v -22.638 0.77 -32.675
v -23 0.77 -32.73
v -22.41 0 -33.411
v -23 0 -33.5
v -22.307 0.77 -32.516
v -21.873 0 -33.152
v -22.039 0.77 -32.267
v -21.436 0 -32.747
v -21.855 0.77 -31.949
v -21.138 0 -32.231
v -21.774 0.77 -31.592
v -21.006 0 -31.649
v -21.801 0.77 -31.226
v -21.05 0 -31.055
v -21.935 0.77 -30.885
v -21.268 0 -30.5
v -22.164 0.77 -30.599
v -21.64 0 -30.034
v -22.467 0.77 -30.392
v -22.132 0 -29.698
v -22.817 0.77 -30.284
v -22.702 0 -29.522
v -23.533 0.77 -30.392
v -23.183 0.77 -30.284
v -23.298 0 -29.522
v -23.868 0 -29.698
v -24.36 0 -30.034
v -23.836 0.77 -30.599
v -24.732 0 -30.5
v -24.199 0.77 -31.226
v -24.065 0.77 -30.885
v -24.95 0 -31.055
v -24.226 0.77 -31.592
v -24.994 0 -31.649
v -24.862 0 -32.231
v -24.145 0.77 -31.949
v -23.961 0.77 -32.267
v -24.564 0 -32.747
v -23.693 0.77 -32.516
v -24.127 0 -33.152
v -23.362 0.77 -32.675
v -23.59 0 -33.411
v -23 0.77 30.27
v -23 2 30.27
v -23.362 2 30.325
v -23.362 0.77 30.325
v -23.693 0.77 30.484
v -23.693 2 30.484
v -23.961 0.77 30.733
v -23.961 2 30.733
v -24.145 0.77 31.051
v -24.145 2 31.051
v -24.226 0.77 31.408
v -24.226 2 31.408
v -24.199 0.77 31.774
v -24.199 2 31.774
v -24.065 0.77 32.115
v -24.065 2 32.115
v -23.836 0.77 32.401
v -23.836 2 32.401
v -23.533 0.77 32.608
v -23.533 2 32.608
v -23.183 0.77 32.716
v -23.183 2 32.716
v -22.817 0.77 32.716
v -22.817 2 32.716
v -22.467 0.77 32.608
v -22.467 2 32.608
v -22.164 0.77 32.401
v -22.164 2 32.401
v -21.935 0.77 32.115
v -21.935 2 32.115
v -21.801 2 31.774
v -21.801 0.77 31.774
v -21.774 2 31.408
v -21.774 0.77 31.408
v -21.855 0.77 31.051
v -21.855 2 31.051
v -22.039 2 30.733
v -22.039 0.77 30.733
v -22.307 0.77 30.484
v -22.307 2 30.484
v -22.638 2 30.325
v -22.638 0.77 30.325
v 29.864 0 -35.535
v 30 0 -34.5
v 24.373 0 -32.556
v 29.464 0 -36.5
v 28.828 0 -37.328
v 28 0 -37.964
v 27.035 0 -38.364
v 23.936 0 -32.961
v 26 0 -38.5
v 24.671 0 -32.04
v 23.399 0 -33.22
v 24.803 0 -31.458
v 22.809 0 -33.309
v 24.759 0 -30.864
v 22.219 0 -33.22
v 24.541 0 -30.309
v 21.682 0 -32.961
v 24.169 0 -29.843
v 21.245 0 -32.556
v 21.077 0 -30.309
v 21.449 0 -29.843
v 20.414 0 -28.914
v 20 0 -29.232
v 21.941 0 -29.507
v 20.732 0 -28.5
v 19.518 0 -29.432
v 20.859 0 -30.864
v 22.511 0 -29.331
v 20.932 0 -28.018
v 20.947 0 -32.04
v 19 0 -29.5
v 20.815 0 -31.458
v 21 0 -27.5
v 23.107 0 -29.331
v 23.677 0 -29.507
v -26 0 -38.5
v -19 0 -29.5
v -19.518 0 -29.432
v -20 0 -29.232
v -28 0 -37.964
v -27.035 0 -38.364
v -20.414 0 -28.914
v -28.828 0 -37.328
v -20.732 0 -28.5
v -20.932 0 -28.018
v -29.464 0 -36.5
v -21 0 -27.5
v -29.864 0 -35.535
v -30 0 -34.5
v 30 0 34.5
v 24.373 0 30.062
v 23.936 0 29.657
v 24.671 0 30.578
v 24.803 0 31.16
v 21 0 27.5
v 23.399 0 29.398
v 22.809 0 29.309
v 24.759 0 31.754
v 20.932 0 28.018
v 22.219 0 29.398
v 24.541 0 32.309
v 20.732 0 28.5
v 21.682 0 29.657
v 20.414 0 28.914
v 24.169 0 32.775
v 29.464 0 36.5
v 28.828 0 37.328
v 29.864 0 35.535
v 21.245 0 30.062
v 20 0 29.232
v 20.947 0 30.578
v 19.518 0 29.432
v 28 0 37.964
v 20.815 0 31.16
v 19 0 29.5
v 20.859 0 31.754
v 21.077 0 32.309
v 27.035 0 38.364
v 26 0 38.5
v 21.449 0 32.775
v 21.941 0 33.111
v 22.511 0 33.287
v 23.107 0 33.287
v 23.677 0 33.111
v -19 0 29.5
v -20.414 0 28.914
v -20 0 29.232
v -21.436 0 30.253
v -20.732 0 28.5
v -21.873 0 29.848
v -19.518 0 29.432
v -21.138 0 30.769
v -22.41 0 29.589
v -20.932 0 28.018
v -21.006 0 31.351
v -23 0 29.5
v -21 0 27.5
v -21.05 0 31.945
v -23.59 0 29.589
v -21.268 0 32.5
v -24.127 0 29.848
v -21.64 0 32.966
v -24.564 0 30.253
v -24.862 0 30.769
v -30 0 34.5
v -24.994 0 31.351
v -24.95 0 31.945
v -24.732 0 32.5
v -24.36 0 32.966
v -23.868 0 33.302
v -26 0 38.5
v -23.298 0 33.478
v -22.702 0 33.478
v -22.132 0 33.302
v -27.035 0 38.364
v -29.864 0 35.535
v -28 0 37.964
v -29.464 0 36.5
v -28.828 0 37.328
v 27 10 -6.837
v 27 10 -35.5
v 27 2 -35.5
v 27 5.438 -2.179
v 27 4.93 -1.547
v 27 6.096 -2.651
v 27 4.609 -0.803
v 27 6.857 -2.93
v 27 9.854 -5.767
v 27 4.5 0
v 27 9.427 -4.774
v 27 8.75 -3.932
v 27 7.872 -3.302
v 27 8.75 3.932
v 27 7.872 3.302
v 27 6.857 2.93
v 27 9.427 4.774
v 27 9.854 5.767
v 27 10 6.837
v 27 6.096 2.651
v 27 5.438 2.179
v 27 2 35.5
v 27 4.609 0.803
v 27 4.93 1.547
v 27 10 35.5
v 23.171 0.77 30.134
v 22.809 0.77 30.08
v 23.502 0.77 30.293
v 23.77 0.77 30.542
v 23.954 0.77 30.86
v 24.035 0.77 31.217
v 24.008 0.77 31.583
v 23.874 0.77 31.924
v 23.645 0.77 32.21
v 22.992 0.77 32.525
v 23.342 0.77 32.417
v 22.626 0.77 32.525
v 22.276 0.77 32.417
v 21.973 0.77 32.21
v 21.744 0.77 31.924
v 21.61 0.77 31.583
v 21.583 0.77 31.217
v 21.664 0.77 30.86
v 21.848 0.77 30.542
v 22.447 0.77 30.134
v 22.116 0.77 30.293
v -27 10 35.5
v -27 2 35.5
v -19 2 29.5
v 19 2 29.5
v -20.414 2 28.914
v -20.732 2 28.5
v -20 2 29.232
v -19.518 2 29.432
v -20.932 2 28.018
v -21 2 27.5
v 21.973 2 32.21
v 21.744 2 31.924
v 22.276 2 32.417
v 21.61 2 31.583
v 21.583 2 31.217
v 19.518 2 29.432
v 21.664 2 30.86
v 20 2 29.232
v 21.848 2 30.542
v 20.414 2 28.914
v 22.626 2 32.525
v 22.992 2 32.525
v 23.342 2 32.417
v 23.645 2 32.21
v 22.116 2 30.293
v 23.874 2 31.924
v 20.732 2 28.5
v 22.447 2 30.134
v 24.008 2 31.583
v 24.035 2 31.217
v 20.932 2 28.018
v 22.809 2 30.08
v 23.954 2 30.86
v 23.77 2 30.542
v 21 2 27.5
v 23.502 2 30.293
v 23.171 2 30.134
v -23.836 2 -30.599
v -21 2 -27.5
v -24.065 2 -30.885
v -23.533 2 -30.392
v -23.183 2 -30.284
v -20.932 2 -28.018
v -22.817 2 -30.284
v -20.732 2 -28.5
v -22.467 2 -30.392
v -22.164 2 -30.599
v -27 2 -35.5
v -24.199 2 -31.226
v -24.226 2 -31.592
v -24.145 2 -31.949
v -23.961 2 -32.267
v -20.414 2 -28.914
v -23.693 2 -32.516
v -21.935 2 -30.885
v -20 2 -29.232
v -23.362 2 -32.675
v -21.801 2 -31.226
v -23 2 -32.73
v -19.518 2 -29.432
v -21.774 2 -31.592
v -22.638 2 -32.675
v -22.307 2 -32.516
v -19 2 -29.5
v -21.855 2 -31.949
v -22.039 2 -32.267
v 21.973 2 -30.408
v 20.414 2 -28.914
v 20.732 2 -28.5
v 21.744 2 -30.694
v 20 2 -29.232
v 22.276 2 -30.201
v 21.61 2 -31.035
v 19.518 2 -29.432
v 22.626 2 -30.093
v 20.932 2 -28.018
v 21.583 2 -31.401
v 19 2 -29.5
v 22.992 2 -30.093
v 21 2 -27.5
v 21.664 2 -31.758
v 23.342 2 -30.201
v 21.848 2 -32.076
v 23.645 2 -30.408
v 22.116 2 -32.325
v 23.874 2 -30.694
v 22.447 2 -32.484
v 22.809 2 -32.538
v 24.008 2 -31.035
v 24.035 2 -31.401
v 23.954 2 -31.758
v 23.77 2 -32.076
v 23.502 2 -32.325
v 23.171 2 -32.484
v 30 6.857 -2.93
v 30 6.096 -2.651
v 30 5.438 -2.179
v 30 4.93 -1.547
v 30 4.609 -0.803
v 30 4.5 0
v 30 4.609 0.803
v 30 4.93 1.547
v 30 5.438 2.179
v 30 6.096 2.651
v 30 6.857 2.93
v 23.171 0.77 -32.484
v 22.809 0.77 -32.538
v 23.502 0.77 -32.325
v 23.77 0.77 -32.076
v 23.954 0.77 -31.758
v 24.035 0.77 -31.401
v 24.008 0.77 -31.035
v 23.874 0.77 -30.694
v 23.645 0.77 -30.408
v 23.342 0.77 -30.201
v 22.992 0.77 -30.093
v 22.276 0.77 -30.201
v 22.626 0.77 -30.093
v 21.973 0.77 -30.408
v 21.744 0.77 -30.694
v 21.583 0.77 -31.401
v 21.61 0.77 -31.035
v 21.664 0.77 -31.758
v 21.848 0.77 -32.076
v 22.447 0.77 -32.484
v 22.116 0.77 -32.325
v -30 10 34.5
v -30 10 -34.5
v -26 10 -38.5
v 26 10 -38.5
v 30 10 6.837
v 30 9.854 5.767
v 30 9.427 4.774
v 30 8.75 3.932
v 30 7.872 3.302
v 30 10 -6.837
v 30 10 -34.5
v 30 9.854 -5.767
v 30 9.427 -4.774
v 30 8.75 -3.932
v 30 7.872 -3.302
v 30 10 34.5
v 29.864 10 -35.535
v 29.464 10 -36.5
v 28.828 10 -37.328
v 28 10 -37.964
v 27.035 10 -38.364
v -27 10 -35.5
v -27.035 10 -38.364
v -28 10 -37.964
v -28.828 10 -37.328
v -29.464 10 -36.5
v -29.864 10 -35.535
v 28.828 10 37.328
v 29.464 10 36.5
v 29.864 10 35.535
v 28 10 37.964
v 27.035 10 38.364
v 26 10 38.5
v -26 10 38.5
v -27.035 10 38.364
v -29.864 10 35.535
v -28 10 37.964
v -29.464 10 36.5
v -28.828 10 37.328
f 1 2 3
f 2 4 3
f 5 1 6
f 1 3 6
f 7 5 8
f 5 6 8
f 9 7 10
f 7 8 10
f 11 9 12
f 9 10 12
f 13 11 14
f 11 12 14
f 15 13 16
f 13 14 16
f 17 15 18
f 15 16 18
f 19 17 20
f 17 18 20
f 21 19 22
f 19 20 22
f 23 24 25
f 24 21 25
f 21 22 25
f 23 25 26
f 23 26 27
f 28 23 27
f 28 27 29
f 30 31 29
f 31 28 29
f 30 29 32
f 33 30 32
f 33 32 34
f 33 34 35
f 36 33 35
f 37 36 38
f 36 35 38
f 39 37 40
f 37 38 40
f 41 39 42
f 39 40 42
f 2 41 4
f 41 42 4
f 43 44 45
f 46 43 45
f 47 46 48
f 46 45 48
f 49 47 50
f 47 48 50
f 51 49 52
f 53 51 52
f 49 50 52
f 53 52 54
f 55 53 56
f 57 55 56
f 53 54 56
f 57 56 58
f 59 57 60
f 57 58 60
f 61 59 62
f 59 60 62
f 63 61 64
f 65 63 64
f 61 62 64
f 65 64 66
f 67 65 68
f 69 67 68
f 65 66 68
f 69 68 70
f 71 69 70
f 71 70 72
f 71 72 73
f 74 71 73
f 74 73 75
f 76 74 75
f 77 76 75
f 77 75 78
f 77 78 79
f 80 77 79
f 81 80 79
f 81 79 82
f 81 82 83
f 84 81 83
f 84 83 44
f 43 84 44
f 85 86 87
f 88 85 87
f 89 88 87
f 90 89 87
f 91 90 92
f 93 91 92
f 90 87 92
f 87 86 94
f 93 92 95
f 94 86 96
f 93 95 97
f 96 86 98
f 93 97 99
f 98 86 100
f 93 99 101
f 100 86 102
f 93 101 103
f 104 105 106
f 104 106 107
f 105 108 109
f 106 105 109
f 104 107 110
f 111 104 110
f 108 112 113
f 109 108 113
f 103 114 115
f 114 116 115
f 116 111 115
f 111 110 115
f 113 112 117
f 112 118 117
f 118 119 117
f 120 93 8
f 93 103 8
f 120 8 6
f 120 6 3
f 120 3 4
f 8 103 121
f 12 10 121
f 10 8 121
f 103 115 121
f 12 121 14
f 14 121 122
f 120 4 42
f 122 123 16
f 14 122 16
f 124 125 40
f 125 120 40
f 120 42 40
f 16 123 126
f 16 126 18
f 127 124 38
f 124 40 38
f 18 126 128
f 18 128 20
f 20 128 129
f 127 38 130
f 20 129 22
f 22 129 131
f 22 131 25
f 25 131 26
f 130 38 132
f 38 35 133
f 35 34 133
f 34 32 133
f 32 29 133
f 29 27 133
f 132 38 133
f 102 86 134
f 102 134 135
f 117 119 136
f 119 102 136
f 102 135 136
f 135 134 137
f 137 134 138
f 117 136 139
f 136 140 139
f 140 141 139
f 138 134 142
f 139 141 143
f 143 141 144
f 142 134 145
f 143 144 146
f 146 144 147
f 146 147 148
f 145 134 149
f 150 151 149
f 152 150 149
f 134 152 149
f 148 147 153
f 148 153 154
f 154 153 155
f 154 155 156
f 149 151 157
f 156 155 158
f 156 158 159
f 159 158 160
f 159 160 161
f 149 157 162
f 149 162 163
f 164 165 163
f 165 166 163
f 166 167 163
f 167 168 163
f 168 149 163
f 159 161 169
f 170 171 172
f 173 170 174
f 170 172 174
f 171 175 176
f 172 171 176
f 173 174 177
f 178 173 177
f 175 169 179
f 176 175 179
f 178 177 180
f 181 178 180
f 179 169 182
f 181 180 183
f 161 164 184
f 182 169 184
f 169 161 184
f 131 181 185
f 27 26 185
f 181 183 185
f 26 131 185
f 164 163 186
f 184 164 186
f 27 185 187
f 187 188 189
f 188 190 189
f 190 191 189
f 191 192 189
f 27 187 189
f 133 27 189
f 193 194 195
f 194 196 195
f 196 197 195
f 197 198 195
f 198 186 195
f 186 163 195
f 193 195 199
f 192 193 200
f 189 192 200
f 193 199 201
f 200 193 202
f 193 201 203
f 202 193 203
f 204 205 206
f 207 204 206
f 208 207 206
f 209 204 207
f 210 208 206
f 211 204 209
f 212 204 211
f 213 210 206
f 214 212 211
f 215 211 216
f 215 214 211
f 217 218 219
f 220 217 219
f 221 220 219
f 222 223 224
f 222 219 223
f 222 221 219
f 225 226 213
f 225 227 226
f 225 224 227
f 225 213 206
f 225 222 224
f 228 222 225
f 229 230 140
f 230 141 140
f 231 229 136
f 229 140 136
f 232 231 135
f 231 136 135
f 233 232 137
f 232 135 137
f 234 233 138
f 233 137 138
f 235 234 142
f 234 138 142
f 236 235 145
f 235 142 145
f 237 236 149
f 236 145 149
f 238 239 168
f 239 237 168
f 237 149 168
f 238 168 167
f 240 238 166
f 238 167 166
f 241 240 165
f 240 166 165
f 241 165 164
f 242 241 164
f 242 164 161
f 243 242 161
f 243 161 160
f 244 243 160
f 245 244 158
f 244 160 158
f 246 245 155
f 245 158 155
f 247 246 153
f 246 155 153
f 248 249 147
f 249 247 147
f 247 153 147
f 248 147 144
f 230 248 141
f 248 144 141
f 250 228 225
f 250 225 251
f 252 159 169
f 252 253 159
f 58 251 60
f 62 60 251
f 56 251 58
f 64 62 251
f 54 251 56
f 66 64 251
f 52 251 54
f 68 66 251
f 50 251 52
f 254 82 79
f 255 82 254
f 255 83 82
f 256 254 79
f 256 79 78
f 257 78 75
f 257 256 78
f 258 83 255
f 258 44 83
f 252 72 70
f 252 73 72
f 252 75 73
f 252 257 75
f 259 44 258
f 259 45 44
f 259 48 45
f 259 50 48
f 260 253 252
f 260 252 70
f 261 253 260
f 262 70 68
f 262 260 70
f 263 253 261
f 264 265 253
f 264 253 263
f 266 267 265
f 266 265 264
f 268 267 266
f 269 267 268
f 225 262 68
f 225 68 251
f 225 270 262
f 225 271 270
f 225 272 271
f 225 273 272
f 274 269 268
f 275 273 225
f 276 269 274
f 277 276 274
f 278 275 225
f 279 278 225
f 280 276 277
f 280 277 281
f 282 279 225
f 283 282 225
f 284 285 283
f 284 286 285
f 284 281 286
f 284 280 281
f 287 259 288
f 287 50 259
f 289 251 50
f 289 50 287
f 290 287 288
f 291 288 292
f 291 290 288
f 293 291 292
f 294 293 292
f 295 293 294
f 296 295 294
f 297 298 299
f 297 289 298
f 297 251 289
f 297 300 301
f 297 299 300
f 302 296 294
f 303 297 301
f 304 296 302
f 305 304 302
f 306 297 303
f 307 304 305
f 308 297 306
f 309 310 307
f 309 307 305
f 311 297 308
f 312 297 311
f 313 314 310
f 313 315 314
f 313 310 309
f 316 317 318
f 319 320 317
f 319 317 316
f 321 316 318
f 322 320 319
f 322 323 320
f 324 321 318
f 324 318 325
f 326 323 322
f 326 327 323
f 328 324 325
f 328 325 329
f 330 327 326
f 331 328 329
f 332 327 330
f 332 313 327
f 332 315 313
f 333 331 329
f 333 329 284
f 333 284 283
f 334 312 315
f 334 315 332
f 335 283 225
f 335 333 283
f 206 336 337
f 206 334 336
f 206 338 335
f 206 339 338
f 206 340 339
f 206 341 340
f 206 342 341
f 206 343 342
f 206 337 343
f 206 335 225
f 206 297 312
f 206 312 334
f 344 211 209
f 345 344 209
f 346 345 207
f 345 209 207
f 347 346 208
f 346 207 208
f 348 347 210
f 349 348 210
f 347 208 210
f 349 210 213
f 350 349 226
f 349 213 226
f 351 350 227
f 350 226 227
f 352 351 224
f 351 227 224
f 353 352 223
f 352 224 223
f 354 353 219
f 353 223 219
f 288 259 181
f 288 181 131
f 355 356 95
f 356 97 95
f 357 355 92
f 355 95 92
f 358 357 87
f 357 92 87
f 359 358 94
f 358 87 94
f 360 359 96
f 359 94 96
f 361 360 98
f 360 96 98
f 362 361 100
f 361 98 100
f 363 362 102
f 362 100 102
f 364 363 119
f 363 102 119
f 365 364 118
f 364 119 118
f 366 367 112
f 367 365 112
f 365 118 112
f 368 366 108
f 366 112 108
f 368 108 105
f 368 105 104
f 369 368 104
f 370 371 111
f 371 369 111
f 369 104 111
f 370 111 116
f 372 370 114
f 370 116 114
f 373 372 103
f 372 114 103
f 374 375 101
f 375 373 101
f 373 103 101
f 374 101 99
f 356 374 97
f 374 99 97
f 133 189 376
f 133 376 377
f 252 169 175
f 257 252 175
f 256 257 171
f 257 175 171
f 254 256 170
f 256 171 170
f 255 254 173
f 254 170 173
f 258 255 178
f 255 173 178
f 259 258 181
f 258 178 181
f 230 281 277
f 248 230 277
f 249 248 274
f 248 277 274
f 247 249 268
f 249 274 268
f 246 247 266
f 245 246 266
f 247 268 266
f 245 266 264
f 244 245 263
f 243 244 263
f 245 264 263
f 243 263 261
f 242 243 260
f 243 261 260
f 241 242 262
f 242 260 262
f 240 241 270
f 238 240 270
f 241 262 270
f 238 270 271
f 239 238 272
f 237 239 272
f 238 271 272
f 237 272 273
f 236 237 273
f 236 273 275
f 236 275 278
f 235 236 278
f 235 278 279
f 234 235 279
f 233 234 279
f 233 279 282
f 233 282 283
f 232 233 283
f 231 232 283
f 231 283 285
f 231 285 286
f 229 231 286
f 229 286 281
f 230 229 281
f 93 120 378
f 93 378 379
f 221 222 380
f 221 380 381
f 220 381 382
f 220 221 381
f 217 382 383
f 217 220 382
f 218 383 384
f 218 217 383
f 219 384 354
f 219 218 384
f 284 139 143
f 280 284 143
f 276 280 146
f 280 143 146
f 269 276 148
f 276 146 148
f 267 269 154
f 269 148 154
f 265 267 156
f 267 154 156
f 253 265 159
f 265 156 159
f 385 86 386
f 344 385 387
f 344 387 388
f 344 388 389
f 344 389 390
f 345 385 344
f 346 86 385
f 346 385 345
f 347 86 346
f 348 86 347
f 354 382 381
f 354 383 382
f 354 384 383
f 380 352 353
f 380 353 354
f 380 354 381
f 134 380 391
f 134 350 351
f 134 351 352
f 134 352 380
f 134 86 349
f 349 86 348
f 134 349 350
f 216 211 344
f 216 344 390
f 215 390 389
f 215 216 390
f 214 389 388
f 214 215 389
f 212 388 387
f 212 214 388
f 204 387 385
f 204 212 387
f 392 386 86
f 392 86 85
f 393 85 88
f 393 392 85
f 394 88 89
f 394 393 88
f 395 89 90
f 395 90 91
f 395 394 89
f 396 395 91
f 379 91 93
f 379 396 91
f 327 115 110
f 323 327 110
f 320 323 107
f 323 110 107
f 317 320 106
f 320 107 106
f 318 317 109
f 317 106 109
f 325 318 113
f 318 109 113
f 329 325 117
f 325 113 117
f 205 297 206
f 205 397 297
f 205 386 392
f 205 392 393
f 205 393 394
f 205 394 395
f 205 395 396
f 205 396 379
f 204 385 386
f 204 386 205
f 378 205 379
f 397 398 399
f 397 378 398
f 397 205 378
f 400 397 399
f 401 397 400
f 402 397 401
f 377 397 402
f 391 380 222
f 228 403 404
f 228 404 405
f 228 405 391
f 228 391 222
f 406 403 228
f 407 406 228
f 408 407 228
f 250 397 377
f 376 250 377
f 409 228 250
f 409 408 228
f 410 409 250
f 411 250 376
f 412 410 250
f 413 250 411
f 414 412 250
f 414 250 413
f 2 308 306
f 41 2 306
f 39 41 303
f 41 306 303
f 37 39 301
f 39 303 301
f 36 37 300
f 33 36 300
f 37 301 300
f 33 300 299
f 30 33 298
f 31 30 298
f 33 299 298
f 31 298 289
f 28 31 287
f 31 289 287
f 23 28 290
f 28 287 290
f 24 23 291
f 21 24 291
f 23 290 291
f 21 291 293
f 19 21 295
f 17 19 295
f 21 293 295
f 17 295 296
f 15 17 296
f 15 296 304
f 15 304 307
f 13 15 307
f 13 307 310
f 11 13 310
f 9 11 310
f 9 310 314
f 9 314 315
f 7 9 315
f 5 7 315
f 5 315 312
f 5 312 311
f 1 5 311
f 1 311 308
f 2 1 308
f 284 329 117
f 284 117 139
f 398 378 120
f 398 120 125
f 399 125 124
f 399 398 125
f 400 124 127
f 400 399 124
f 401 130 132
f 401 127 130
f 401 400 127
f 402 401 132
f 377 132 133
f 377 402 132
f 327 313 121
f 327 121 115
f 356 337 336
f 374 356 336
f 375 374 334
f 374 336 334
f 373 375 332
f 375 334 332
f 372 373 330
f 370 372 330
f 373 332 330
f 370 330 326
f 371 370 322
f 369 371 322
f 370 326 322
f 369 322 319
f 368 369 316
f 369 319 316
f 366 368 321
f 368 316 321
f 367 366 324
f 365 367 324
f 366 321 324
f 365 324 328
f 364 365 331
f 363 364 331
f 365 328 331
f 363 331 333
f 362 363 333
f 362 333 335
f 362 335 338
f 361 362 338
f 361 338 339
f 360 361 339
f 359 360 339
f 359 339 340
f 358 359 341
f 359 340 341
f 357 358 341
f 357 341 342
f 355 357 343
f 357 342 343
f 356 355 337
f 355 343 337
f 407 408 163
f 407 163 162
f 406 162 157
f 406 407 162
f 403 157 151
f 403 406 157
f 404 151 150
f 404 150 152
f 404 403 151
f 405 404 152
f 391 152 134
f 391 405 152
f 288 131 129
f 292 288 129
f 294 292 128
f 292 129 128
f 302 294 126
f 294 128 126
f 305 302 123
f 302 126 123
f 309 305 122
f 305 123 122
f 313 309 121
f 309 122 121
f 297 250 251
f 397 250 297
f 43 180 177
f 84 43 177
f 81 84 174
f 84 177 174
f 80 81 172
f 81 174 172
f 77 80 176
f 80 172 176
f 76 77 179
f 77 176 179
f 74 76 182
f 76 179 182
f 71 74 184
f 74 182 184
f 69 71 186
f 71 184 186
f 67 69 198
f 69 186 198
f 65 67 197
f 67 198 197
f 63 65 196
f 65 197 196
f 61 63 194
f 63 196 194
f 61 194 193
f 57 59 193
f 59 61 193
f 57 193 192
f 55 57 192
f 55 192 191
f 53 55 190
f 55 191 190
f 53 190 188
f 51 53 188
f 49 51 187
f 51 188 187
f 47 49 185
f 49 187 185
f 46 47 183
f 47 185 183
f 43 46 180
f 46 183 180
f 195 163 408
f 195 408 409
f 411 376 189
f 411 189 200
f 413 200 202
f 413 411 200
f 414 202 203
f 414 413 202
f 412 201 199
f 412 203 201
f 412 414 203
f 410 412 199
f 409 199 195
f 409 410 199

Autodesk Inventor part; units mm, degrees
ref_plane "YZ Plane" through (0, 0, 0) normal (1, 0, 0) x (0, 1, 0)
ref_plane "XZ Plane" through (0, 0, 0) normal (0, 1, 0) x (-1, 0, 0)
ref_plane "XY Plane" through (0, 0, 0) normal (0, 0, 1) x (1, 0, 0)
sketch "Sketch1" plane through (0, 0, 0) normal (0, 1, 0) x (-1, 0, 0)
  line L0 (-30, 38.5) -> (30, 38.5)
  line L1 (30, 38.5) -> (30, -38.5)
  line L2 (30, -38.5) -> (-30, -38.5)
  line L3 (-30, -38.5) -> (-30, 38.5)
  line L4 (-30, 38.5) -> (30, -38.5) construction
  line L5 (30, 38.5) -> (-30, -38.5) construction
  point P0 (0, 0)
  dimension "d0" = 60
  dimension "d1" = 77
extrude "Extrusion1" add sketch "Sketch1" along normal blind 10
sketch "Sketch2" plane through (0, 10, 0) normal (0, 1, 0) x (1, 0, 0)
  line L0 (27, -35.5) -> (-27, -35.5)
  line L1 (-27, -35.5) -> (-27, 35.5)
  line L2 (-27, 35.5) -> (27, 35.5)
  line L3 (27, 35.5) -> (27, -35.5)
  line L4 (27, -35.5) -> (-27, 35.5) construction
  line L5 (-27, -35.5) -> (27, 35.5) construction
  point P0 (0, 0)
  dimension "d4" = 54
  dimension "d5" = 71
extrude "Extrusion2" cut sketch "Sketch2" against normal blind 8
sketch "Sketch3" plane through (0, 2, 0) normal (0, 1, 0) x (1, 0, 0)
  line L0 (21, -29.5) -> (-21, -29.5)
  line L1 (-21, -29.5) -> (-21, 29.5)
  line L2 (-21, 29.5) -> (21, 29.5)
  line L3 (21, 29.5) -> (21, -29.5)
  line L4 (21, -29.5) -> (-21, 29.5) construction
  line L5 (-21, -29.5) -> (21, 29.5) construction
  point P0 (0, 0)
  dimension "d8" = 42
  dimension "d9" = 59
extrude "Extrusion3" cut sketch "Sketch3" against normal blind 7
fillet "Fillet1" radius 4 4 edges at (-30, 5, 38.5) (30, 5, 38.5) (-30, 5, -38.5) (30, 5, -38.5)
sketch "Sketch4" plane through (0, 0, 0) normal (0, -1, 0) x (1, 0, 0)
  point P0 (0, 0)
sketch "Sketch5" plane through (0, 0, 0) normal (0, -1, 0) x (1, 0, 0)
  point P0 (0, 0)
  point P1 (22.809, 31.309)
  point P2 (22.809, -31.309)
  point P3 (-23, 31.5)
  point P4 (-23, -31.5)
hole "Hole1" at (22.809, 0, 31.309) at (22.809, 0, -31.309) at (-23, 0, -31.5) at (-23, 0, 31.5) direction (0, 1, 0) diameter 2.459 depth 8.8 tip angle 118 countersink diameter 4 countersink angle 90 thread size "M3x0.5" class "6H" standard "ANSI Metric M Profile"
sketch "Sketch7" plane through (30, 0, 34.5) normal (1, 0, 0) x (0, 0, -1)
  point P0 (34.5, 0)
  point P1 (34.5, 7.5)
hole "Hole2" at (30, 7.5, 0) direction (-1, 0, 0) diameter 6 depth 8.8 tip angle 118
fillet "Fillet2" radius 4 2 edges at (28.5, 10, -1.6583) (28.5, 10, 1.6583)
fillet "Fillet3" radius 2 1 edges at (-21, 1, -29.5)
fillet "Fillet4" radius 2 1 edges at (-21, 1, 29.5)
fillet "Fillet5" radius 2 1 edges at (21, 1, 29.5)
fillet "Fillet6" radius 2 1 edges at (21, 1, -29.5)
equation "\"x\" = 54"
equation "\"z\" = 71"
equation "\"hole\" = 4"
properties part number "cardboardmountfront_sjc"
